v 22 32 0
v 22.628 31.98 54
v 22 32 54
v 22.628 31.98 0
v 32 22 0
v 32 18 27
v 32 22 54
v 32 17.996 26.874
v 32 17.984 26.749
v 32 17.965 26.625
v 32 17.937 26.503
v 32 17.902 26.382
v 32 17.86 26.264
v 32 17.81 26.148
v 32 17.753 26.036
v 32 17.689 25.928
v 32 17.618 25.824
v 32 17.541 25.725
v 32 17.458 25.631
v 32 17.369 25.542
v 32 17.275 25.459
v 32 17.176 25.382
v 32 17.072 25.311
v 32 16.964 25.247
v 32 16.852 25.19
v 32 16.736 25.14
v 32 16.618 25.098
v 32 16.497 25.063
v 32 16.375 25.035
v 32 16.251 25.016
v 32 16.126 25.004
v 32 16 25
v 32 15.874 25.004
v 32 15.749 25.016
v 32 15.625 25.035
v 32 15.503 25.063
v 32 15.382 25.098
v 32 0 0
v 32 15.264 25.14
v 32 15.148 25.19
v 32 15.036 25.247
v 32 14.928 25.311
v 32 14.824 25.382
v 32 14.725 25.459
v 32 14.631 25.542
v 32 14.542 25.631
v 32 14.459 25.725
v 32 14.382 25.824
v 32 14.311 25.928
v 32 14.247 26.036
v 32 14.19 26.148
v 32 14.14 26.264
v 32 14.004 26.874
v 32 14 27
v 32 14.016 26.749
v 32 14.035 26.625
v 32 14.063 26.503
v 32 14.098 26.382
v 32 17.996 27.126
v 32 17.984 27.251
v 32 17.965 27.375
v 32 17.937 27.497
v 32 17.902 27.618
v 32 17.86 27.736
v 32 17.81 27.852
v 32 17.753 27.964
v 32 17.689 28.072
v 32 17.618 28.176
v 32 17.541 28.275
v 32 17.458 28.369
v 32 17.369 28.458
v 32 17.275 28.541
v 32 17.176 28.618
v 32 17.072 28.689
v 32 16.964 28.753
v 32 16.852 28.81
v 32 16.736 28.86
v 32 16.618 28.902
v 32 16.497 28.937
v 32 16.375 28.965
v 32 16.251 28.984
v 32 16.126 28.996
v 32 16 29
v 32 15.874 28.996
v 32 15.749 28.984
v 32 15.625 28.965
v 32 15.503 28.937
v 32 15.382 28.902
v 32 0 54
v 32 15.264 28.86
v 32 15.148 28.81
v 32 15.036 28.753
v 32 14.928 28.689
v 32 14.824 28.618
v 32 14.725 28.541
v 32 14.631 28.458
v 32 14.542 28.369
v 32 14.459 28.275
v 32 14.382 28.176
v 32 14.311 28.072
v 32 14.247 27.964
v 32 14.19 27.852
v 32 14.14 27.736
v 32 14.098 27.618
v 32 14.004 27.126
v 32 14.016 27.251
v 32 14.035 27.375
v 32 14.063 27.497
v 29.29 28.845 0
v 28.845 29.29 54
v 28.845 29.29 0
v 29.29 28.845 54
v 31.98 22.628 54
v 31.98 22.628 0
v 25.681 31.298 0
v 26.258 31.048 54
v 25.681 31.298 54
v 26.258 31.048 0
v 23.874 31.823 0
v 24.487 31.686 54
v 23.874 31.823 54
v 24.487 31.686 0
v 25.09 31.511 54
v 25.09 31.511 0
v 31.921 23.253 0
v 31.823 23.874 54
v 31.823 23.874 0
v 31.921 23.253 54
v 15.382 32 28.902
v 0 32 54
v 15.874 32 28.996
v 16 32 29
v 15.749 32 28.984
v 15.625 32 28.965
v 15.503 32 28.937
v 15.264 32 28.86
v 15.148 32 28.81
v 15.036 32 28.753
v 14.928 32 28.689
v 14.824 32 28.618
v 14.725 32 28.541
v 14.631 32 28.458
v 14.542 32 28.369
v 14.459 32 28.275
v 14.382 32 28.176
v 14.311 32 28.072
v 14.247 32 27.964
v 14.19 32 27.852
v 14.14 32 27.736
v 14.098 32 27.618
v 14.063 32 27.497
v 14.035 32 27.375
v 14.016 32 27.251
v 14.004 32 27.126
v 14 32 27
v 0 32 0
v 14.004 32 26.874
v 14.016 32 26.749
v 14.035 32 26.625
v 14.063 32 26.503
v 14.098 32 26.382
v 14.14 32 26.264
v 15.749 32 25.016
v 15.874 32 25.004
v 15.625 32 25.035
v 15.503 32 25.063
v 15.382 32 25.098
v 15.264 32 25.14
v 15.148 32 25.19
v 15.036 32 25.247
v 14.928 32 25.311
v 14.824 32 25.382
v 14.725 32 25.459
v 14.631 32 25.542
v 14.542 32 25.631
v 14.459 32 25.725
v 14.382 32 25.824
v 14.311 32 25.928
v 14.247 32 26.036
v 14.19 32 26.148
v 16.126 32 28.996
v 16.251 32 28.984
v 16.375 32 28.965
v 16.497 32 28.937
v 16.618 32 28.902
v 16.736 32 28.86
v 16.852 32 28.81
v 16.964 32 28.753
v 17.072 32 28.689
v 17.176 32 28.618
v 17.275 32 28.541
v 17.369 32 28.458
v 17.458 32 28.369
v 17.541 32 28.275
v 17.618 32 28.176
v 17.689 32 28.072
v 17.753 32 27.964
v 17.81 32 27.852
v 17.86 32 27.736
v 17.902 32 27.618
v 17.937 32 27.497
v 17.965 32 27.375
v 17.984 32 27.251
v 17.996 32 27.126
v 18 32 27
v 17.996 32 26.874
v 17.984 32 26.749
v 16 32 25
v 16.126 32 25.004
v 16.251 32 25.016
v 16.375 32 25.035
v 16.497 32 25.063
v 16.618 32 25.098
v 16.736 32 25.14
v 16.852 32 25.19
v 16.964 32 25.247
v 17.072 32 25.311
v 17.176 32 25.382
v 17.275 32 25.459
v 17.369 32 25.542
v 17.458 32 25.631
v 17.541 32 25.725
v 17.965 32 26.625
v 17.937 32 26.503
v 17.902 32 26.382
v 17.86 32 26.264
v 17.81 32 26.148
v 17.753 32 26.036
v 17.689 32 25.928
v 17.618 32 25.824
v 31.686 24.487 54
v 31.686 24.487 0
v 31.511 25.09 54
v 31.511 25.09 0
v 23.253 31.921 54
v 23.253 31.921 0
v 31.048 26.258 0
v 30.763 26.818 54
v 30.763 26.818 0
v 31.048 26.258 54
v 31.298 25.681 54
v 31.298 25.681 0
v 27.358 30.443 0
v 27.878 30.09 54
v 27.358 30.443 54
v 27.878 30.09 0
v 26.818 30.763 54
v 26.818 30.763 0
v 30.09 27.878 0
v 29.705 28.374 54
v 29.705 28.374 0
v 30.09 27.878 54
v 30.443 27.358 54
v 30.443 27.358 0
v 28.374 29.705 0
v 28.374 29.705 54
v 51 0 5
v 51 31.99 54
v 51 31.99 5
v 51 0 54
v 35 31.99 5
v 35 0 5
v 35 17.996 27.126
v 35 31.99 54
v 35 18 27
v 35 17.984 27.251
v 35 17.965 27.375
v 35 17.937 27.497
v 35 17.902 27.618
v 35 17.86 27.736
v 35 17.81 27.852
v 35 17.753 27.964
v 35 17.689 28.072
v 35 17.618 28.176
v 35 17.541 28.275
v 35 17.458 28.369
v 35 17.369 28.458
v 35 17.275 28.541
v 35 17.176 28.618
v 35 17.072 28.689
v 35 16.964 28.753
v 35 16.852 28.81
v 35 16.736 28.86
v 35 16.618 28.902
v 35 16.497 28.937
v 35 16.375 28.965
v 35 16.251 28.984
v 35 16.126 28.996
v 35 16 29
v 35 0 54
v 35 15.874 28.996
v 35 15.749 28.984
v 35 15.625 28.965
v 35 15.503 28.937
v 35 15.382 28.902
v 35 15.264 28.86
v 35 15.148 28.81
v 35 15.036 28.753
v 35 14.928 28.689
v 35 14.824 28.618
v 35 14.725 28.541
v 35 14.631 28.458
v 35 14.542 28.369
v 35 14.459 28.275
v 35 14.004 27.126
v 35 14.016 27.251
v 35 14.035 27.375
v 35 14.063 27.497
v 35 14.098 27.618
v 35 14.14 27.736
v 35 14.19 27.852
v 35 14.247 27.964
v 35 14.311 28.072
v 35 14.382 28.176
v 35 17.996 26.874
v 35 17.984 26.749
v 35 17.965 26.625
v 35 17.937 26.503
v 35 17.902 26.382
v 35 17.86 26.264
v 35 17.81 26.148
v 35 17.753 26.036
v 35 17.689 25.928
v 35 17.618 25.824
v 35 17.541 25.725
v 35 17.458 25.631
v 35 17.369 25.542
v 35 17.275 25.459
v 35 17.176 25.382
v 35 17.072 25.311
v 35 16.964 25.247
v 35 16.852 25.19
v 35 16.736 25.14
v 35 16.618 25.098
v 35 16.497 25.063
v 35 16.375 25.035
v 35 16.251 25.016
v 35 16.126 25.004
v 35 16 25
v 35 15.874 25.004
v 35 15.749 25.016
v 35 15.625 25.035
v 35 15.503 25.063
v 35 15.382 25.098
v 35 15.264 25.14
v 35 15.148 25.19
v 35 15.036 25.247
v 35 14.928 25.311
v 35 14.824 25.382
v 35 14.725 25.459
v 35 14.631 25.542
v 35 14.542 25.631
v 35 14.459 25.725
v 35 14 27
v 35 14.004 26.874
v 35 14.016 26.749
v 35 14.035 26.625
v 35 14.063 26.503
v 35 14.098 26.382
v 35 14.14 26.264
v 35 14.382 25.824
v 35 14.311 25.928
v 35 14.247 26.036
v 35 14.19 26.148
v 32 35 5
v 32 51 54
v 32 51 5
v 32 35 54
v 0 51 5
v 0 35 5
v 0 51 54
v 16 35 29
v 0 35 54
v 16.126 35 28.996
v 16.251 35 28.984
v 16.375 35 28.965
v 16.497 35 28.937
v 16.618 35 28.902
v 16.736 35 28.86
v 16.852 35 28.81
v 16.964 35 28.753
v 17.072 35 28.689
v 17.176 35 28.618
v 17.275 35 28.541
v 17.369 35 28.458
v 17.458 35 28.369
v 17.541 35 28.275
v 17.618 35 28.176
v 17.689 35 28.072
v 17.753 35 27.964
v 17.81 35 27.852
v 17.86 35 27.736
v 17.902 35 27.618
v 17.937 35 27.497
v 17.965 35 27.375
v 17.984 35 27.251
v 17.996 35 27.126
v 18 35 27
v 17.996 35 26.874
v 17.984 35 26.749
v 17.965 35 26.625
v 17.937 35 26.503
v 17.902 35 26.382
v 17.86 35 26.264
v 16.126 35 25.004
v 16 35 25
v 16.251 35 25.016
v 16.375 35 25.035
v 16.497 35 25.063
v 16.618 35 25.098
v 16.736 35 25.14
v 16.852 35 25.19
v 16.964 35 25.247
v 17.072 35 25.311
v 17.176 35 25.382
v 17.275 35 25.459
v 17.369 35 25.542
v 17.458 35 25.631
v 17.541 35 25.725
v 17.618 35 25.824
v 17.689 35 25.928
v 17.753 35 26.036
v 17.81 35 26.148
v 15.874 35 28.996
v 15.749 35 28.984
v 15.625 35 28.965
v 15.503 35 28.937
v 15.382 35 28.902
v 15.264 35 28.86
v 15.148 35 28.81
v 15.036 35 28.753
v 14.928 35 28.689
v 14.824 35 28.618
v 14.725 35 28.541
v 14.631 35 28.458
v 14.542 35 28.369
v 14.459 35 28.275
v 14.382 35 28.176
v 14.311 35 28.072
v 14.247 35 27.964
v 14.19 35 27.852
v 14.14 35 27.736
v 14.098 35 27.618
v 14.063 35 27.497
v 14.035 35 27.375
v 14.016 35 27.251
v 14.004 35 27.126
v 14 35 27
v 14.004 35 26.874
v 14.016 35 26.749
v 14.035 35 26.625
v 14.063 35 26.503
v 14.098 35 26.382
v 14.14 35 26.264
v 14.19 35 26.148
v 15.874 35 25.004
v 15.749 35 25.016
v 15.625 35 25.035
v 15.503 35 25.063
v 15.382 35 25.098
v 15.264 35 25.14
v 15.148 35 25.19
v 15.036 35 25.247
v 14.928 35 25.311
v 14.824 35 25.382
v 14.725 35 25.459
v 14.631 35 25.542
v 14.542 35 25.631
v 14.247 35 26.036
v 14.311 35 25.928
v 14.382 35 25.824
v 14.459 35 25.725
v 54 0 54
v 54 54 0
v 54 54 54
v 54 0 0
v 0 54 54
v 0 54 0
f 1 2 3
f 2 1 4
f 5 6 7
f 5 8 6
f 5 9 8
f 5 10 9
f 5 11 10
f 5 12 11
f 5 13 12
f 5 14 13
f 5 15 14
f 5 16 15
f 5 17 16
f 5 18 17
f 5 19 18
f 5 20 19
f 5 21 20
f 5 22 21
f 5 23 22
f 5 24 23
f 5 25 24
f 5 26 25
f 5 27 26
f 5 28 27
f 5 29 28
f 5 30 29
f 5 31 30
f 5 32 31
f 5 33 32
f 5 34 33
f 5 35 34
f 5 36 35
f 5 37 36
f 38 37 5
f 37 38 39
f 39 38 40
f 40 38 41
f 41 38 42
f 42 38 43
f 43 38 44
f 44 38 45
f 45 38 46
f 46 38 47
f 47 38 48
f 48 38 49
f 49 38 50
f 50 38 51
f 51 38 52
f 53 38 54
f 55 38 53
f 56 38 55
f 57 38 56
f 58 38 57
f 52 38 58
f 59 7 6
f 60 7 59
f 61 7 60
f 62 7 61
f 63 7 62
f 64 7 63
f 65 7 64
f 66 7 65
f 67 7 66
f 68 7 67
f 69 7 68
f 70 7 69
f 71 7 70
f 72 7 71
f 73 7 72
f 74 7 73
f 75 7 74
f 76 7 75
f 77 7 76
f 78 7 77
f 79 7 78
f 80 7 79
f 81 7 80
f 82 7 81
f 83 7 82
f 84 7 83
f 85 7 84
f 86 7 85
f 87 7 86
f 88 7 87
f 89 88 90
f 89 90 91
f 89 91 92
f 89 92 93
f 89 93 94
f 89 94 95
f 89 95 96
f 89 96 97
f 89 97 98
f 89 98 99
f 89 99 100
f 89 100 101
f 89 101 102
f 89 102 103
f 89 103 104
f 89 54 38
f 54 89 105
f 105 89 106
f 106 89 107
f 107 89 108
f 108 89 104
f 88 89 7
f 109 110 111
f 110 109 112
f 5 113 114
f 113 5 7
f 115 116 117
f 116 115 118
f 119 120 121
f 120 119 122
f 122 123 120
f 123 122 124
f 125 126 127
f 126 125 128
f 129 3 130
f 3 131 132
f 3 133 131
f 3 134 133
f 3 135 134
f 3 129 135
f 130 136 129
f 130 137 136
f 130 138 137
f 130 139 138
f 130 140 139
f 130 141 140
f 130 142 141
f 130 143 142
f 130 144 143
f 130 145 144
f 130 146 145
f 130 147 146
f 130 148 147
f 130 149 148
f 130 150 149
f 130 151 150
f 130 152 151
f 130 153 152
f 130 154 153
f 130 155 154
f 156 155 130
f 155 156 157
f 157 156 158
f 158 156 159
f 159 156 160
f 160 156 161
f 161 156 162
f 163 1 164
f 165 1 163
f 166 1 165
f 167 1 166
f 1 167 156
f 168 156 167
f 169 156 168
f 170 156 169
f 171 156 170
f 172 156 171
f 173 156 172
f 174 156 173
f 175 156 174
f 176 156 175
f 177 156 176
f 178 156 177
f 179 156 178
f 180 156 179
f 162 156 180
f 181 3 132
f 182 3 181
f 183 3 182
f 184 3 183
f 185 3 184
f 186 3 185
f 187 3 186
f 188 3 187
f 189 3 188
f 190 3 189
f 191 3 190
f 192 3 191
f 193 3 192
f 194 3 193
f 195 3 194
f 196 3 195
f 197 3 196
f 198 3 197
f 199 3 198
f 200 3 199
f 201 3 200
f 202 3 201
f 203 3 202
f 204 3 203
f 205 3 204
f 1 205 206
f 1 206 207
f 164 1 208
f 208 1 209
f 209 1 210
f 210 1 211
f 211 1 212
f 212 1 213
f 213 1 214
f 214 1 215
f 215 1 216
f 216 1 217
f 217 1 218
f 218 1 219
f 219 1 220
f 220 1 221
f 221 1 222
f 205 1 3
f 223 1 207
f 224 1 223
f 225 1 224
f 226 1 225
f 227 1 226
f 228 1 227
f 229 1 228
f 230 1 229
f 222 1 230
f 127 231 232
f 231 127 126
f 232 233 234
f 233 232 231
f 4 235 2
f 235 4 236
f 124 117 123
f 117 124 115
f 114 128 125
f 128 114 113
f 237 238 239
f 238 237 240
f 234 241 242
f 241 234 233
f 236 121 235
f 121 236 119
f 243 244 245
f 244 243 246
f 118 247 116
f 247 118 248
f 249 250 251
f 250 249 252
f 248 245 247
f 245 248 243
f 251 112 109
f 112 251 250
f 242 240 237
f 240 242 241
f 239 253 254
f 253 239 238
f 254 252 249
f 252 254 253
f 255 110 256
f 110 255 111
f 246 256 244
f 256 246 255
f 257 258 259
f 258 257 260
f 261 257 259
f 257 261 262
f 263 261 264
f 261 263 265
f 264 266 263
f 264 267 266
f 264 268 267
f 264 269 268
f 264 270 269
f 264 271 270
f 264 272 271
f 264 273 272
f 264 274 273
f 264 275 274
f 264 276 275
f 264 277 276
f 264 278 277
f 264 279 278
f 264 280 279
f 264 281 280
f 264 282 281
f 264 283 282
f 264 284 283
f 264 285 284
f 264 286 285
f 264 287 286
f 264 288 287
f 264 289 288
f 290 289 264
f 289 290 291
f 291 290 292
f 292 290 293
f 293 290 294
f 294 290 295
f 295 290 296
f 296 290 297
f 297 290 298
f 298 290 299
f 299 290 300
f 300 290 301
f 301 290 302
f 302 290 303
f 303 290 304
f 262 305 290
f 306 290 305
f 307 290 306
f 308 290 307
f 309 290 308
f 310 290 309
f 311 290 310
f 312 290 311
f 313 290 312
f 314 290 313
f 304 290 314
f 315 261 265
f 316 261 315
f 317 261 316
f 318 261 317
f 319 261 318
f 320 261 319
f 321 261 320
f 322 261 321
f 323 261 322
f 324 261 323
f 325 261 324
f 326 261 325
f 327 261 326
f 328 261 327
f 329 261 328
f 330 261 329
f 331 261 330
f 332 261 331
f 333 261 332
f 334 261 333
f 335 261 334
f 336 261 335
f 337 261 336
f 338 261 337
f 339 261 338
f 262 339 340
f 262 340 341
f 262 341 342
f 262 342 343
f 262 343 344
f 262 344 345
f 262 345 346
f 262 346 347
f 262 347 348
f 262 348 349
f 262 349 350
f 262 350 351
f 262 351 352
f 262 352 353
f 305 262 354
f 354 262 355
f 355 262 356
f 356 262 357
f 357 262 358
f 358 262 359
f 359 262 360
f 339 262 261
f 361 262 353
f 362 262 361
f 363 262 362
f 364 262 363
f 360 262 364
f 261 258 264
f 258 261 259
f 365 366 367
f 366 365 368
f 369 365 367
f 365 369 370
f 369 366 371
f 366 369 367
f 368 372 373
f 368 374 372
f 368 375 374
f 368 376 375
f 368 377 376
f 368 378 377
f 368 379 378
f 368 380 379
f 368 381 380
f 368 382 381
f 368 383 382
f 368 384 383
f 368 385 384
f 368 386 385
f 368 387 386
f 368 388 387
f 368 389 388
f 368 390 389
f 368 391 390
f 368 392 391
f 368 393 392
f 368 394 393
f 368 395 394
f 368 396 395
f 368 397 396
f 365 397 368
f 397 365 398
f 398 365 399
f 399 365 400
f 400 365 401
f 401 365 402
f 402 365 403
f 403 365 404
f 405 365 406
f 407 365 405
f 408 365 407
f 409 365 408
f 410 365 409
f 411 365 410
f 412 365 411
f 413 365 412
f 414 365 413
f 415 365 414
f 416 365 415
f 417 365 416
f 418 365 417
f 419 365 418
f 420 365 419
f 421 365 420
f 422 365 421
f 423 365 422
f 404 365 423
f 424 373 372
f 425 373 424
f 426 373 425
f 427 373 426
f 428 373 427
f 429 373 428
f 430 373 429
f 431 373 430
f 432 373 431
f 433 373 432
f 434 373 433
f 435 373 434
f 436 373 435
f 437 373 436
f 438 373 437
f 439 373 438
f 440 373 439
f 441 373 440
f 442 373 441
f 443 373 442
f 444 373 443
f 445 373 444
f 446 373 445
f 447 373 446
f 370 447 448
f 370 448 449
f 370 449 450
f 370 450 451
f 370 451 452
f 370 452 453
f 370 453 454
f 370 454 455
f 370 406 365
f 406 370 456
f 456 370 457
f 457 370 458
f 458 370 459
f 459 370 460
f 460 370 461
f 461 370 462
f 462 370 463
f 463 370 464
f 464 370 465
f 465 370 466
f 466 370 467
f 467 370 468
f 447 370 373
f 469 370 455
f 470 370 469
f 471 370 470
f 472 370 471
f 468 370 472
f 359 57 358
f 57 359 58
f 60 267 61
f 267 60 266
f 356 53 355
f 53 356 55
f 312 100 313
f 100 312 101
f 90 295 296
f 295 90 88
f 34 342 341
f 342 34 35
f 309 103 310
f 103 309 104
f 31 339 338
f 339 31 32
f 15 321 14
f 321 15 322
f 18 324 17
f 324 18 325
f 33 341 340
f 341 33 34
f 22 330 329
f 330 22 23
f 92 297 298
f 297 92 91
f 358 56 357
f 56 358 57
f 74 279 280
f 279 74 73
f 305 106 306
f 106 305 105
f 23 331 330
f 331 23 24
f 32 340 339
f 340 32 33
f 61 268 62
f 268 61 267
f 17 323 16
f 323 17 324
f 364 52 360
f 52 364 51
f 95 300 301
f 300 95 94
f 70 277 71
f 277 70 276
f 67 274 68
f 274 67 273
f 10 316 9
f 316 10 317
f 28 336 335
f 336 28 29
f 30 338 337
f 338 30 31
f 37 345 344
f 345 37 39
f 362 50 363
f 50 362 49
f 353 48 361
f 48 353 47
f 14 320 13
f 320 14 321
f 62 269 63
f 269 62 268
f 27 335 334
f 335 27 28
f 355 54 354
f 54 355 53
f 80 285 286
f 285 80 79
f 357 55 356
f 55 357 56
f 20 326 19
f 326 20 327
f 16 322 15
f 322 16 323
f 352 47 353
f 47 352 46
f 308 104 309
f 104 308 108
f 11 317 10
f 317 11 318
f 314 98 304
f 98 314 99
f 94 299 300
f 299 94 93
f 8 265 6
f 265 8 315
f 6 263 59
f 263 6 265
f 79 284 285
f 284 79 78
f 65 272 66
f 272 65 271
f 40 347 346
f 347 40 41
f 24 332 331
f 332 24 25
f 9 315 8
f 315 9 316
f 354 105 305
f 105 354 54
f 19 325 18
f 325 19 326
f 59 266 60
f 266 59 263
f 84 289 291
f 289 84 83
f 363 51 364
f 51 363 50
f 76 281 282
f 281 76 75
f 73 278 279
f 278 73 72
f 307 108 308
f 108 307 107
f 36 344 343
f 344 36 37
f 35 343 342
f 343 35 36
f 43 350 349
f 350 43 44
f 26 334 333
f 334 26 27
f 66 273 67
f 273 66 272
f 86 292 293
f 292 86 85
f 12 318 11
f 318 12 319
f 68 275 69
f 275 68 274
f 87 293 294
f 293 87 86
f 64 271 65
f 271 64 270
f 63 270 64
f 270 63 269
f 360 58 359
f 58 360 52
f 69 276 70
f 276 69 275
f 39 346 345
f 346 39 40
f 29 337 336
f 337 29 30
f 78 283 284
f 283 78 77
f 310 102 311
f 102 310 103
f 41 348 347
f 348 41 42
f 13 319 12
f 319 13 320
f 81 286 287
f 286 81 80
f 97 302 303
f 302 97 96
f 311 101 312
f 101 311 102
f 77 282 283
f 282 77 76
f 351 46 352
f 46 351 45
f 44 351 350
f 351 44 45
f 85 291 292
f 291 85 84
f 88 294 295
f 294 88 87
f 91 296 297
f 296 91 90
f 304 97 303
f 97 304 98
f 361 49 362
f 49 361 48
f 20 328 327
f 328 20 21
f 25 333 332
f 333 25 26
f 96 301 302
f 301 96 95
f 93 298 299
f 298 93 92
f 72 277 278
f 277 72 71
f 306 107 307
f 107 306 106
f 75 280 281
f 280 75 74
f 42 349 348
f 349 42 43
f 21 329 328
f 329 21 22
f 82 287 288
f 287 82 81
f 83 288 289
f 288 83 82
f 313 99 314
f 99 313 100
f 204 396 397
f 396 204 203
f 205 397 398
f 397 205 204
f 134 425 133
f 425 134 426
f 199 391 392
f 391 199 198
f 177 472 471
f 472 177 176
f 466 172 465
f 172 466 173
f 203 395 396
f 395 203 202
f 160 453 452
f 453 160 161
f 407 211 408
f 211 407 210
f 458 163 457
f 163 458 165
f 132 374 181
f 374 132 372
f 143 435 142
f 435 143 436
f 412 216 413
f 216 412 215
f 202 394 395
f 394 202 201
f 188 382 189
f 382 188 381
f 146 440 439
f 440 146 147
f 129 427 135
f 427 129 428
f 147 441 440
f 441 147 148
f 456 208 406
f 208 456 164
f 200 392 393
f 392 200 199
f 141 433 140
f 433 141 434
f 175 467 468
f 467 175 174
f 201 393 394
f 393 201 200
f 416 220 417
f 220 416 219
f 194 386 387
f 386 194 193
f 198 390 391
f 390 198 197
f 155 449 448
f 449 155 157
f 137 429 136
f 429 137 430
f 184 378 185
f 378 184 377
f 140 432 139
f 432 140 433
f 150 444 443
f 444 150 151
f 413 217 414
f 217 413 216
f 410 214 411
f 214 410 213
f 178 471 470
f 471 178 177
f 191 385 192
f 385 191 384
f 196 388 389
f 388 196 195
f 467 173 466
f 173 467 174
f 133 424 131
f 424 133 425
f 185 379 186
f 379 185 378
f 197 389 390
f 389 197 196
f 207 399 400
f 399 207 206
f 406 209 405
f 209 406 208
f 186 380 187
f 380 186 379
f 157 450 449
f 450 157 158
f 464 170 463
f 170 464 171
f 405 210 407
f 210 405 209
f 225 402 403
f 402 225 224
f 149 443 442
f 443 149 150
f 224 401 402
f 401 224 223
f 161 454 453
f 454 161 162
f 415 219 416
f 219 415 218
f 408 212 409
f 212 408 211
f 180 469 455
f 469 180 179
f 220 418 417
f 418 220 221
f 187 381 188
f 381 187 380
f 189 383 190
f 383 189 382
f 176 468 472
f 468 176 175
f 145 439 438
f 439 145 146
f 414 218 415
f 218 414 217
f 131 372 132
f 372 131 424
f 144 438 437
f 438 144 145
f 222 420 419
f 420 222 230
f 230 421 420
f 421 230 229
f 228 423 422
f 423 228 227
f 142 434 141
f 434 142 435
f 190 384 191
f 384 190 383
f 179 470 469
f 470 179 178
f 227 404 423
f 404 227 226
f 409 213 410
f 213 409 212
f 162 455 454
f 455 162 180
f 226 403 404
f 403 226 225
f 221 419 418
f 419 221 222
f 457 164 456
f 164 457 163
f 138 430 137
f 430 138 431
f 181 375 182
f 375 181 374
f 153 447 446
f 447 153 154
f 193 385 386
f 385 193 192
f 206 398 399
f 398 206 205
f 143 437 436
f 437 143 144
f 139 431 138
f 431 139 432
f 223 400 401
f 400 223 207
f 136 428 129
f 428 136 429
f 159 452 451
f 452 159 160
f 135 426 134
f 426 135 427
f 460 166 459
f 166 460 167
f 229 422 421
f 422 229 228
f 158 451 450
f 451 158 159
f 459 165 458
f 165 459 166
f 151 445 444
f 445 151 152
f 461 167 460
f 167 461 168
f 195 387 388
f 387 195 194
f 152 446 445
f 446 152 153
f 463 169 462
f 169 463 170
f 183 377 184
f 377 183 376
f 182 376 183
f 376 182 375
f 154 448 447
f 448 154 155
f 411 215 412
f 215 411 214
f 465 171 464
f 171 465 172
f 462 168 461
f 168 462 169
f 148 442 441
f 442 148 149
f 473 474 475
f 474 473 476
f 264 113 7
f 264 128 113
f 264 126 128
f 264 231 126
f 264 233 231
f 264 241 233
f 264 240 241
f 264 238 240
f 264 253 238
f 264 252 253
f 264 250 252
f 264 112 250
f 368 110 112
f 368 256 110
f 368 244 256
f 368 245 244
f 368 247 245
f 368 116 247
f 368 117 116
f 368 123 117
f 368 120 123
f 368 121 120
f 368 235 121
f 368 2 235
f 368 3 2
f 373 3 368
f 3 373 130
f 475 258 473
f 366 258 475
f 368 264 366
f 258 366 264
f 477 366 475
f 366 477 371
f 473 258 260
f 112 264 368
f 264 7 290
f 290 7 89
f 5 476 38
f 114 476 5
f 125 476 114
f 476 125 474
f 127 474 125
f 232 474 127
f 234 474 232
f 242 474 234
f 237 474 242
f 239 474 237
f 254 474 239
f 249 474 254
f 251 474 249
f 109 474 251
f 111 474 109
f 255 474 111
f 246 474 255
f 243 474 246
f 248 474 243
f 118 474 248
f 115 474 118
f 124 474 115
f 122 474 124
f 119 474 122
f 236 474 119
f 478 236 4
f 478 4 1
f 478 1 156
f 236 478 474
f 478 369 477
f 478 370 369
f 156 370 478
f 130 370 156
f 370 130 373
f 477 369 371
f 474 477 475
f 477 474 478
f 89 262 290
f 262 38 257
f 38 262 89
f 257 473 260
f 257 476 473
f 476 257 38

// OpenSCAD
/***********************************************************************************************************************************
'Shelfie' Do it yourself shelf and storage designer by: Mike Thompson 10/4/2015, http://www.thingiverse.com/mike_linus
Based on original concept idea from Milla Niskakoski http://www.thingiverse.com/thing:681835

Licensing: This work is licensed under a Creative Commons Attribution-NonCommercial-ShareAlike 3.0 Australia License.  Further 
information is available here - http://creativecommons.org/licenses/by-nc-sa/3.0/au/deed.en_GB

I was very impressed with the simplicity and practicality of Milla's initial design, but ran into some major limitations when trying to
construct my own shelves.  The key issues I encountered were:
- No customisable thicknesses. Like may others, I wanted to use the scrap wood I had lying around rather than purchase new material.
- No mixed thicknesses. I wanted to use glass shelves with wood sides, but it wasn't possible unless they were the same thickness.
- No wall mounting bracket option.  Particularly for tall shelves, this is an important safety feature.
- No ability to alter the size of the bracket or the wall thickness to increase strength.
- No ability to attach a shelf midspan.  This is a big issue if you have long sections and want to add a shelf in-between.

Shelfie provides full control over all parameters so you can mix materials of any thickness, add wall mounts, alter the bracket size,
mid mount shelves, change the screw hole size etc. 

Note: incremental 0.01 values added to fix diplay anomalies when using preview (F5)

Instructions: select the bracket type and options to suit your particular materials below. 
************************************************************************************************************************************/

/**************************************************************************
Enter the values corresponding to your bracket requirements in this section
***************************************************************************/

/* [Bracket Options] */

//Bracket Type
bracket_type="L";//[L,T,X,L Foot,T Foot]
//Bracket cube size
bracket_size = 54;//54
//Thickness of Panel 1
panel_thickness = 16;
//Thickness of Panel 2
panel2_thickness = 16;
//Flip bracket for opposite orientation
flip = "false";//[false,true]
//Thickness of panel walls
wall_thickness = 3;
//Thickness of base
base_thickness=5;
//Hole radius (set to 0 to remove)
hole_radius=2;
//Allow pass through for mid-span brackets
pass_through="false";//[false,true]
//Add wall mount plate
wall_mount = "false";//[false,true]

/* [Hidden] */
$fn=100;

panel_depth=bracket_size-panel_thickness-(wall_thickness*2);
panel_depth2=bracket_size-panel2_thickness-(wall_thickness*2);

module L_piece()
{
    difference()
    {
        cube(bracket_size);
        union()
        {
            hull()//corner cutout
            {
                if(wall_mount=="true")
                {
                    translate([0,0,wall_thickness])
                    {
                        translate([-0.001,-0.001,-0.001])cube([10,10,bracket_size]);
                        translate([bracket_size-panel_thickness-(wall_thickness*2)-10,0,-0.01])cube([10,10,bracket_size]);
                        translate([-0.01,bracket_size-panel2_thickness-(wall_thickness*2)-10,-0.01])cube([10,10,bracket_size]);
                        translate([bracket_size-panel_thickness-(wall_thickness*2)-10,bracket_size-panel2_thickness-(wall_thickness*2)-10,0])cylinder(h=bracket_size,r=10);
                    }
                }
                else
                {
                    translate([-0.001,-0.001,-0.001])cube([10,10,bracket_size+0.01]);
                    translate([bracket_size-panel_thickness-(wall_thickness*2)-10,-0.01,-0.01])cube([10,10,bracket_size+0.02]);
                    translate([-0.01,bracket_size-panel2_thickness-(wall_thickness*2)-10,-0.01])cube([10,10,bracket_size+0.02]);
                    translate([bracket_size-panel_thickness-(wall_thickness*2)-10,bracket_size-panel2_thickness-(wall_thickness*2)-10,0])cylinder(h=bracket_size+0.02,r=10);
                }
            }
            if(wall_mount=="true") //cut hole in wall mount area
            {
                translate([bracket_size/3,bracket_size/3,0])cylinder(r=hole_radius,h=wall_thickness+0.01);
            }
            //panel cutout
            translate([bracket_size-wall_thickness-panel_thickness,-0.01,base_thickness])cube([panel_thickness,panel_depth2,bracket_size-base_thickness+0.01]);
            //panel2 cutout
            if (pass_through=="true")
            {
                translate([-0.01,bracket_size-wall_thickness-panel2_thickness,base_thickness])cube([bracket_size+0.02,panel2_thickness,bracket_size-base_thickness+0.01]);
            }
            else
            {
                translate([-0.01,bracket_size-wall_thickness-panel2_thickness,base_thickness])cube([panel_depth+0.01,panel2_thickness,bracket_size-base_thickness+0.01]);
            }
            //inside holes
            translate([panel_depth,panel_depth2/2,bracket_size/2])rotate([0,90,0])cylinder(h=wall_thickness+0.01,r=hole_radius);
            translate([panel_depth/2,panel_depth2+wall_thickness,bracket_size/2])rotate([90,0,0])cylinder(h=wall_thickness++0.01,r=hole_radius);
        }
    }
}

module T_piece()
{
    difference()
    {
        union()
        {
            L_piece();
            translate([(bracket_size*2)-(wall_thickness*2)-panel_thickness,0,0])mirror(0,1,0)L_piece();
        }
        //repunch holes
        translate([panel_depth-0.5,panel_depth2/2,bracket_size/2])rotate([0,90,0])cylinder(h=(wall_thickness*2)+panel_thickness+1,r=hole_radius);
    }
}

module X_piece()
{
    difference()
    {
        union()
        {
            T_piece();
            translate([(bracket_size*2)-(wall_thickness*2)-panel_thickness,(bracket_size*2)-(wall_thickness*2)-panel2_thickness,0])rotate([0,0,180])T_piece();
        }
        //repunch holes
        translate([panel_depth/2,panel_depth+panel_thickness+(wall_thickness*2),bracket_size/2])rotate([90,0,0])cylinder(h=(wall_thickness*2)+panel2_thickness+1,r=hole_radius);
        translate([(panel_depth/2)+bracket_size,panel_depth+panel_thickness+(wall_thickness*2),bracket_size/2])rotate([90,0,0])cylinder(h=(wall_thickness*2)+panel2_thickness+1,r=hole_radius);
    }
}

module L_foot()
{
    L_piece();
    translate([bracket_size,bracket_size+(bracket_size*0.60),0])mirror(0,0,1)rotate([90,0,0])
    hull()
    {
        cube(30);
        translate([0,0,bracket_size*0.60])cube([bracket_size,bracket_size,1]);
    }
}

module T_foot()
{
    T_piece();
    translate([bracket_size-wall_thickness-(panel_thickness/2),bracket_size+(bracket_size*0.60),0])mirror(0,0,1)rotate([90,0,0])
    hull()
    {
       translate([-15,0,0])cube(30);
       translate([-bracket_size/2,0,bracket_size*0.60])cube([bracket_size,bracket_size,1]);
    }
}

if (bracket_type=="L")
{
    if(flip=="true")
    {
        mirror()L_piece();
    }
    else
    {
        L_piece();
    }
}
if (bracket_type=="T")
{
    T_piece();
}
if (bracket_type=="X")
{
    X_piece();
}
if (bracket_type=="L Foot")
{
    if(flip=="true")
    {
        mirror()L_foot();
    }
    else
    {
        L_foot();
    }
}
if (bracket_type=="T Foot")
{
    T_foot();
}
